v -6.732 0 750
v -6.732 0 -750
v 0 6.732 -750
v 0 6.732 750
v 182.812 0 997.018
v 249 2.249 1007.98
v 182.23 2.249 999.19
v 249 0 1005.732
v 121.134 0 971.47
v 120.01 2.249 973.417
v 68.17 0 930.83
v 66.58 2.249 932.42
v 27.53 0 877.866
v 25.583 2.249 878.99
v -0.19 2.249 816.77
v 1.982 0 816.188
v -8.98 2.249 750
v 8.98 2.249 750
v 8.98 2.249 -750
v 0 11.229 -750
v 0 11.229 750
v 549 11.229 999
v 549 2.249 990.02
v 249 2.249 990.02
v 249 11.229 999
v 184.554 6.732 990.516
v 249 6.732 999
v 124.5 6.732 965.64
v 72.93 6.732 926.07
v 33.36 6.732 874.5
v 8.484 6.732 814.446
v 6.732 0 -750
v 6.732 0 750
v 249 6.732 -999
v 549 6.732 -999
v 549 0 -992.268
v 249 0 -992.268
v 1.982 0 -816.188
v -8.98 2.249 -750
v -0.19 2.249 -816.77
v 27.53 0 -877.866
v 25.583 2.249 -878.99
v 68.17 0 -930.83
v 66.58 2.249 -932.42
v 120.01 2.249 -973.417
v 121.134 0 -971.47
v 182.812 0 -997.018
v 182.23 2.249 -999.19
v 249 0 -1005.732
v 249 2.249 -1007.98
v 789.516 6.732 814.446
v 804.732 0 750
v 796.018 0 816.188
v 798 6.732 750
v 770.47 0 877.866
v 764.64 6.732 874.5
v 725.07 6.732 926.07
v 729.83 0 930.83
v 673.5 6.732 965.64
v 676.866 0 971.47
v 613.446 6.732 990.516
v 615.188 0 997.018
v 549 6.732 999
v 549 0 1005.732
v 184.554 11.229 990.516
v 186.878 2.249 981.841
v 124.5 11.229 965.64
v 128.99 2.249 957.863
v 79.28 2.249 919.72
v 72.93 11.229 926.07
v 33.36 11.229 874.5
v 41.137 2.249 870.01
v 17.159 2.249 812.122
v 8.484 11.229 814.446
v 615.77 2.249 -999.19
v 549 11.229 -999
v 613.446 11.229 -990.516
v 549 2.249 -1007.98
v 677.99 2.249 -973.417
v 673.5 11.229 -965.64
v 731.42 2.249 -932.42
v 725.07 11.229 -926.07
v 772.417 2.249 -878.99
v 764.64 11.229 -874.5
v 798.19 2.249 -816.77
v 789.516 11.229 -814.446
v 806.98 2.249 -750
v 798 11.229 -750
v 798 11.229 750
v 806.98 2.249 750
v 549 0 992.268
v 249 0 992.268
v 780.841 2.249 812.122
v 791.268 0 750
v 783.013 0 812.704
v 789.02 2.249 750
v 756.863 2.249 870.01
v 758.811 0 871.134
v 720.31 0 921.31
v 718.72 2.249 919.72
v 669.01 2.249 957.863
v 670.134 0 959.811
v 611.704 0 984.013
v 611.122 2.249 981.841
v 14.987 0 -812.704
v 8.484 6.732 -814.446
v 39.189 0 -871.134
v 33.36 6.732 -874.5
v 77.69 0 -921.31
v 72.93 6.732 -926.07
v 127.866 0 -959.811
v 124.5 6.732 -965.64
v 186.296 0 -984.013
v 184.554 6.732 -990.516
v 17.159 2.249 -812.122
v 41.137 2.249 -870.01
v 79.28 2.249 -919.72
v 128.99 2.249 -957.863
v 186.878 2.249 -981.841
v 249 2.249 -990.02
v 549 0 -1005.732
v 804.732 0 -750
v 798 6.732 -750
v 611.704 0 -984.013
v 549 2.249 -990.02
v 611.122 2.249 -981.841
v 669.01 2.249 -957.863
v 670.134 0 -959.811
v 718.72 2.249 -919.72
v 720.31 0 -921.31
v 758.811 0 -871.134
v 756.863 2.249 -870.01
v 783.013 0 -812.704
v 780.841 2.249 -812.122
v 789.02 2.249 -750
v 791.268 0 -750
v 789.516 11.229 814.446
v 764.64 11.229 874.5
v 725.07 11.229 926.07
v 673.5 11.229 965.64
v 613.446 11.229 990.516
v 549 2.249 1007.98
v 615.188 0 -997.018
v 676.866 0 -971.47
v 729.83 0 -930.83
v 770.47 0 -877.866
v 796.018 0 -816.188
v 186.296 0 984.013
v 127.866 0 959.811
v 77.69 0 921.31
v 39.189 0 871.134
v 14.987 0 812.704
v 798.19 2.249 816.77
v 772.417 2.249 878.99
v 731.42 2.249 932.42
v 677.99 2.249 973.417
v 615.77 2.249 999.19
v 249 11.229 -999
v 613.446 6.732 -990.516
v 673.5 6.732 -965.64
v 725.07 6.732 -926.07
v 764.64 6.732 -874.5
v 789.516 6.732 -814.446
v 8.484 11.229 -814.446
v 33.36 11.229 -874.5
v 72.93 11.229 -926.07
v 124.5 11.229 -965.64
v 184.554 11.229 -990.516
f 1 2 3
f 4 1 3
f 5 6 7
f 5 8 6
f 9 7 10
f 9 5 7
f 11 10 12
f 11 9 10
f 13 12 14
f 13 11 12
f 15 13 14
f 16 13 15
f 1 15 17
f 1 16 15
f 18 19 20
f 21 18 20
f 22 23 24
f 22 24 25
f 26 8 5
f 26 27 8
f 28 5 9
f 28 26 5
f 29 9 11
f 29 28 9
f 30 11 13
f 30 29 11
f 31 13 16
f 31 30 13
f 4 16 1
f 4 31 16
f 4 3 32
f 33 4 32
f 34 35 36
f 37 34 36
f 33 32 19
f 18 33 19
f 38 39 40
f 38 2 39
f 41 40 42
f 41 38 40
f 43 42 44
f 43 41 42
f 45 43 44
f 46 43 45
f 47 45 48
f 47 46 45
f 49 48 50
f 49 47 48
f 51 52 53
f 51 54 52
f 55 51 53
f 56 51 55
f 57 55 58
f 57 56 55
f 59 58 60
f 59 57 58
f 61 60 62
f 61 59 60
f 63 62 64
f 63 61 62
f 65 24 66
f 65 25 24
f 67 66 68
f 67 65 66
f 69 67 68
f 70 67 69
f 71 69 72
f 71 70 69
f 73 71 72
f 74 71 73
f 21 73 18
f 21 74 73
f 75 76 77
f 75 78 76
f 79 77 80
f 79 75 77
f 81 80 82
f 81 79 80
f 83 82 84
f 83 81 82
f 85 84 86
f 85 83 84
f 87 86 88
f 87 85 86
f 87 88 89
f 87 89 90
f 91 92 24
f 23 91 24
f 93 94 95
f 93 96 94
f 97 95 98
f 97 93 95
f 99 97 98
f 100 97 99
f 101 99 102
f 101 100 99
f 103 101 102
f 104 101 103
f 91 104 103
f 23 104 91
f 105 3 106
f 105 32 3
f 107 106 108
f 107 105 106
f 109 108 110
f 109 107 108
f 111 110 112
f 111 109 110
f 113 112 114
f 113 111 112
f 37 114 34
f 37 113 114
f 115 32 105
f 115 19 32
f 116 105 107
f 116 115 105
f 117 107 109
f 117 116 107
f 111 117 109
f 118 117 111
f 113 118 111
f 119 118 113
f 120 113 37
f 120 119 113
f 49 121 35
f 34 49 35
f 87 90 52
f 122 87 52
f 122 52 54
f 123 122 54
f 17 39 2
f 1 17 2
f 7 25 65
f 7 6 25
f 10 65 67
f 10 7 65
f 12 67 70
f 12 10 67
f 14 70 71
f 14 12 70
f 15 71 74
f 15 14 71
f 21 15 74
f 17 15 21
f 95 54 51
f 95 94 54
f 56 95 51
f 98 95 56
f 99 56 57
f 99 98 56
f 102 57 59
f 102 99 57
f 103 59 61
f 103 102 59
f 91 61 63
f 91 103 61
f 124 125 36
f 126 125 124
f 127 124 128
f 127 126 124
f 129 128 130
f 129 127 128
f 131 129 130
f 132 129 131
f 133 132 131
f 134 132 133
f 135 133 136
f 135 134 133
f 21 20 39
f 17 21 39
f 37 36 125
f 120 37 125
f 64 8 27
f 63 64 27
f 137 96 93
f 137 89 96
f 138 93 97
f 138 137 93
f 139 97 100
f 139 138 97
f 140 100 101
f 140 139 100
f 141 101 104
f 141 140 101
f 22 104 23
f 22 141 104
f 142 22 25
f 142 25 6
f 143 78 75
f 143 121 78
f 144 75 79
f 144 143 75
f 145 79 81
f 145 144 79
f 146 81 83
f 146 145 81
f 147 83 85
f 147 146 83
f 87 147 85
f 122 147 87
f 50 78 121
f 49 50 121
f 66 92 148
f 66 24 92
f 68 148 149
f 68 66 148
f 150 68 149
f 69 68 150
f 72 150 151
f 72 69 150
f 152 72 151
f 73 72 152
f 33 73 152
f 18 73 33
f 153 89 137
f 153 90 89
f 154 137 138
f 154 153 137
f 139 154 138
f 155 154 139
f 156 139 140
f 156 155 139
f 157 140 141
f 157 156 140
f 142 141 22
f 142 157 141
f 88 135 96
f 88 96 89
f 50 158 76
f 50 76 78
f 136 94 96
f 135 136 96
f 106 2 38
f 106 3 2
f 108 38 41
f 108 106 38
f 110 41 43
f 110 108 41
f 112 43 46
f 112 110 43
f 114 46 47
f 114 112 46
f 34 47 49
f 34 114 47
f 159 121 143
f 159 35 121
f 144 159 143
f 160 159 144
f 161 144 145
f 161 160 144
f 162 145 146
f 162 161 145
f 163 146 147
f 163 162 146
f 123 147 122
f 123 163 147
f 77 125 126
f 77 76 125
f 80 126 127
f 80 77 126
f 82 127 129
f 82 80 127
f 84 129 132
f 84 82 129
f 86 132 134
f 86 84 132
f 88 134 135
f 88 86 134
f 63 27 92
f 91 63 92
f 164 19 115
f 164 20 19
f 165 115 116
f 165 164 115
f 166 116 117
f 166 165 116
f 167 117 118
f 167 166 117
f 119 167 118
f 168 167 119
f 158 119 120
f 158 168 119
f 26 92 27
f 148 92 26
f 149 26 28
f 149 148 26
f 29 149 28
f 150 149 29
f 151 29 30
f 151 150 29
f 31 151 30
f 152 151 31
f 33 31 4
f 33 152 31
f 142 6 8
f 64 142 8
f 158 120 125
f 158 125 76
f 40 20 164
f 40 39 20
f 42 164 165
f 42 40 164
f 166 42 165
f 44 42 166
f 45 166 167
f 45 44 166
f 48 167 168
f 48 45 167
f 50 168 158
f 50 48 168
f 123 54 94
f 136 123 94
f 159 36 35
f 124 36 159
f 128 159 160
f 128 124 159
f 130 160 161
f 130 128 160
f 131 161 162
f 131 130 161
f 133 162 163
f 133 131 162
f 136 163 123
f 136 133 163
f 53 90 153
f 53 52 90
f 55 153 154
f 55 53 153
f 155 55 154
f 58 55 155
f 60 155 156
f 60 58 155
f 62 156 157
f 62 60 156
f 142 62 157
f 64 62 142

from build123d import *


with BuildPart() as part:
    # Varredura1: sweep along a path in Esboço2
    with BuildLine(Plane(origin=(0, 0, 0), x_dir=(1, 0, 0), z_dir=(0, 1, 0))) as varredura1_path:
        Line((0, -750), (0, 750))
        ThreePointArc((0, 750), (72.930411485, 926.069588515), (249, 999))
        Line((249, 999), (549, 999))
        ThreePointArc((549, 999), (725.069588515, 926.069588515), (798, 750))
        Line((798, 750), (798, -750))
        ThreePointArc((798, -750), (725.069588515, -926.069588515), (549, -999))
        Line((549, -999), (249, -999))
        ThreePointArc((249, -999), (72.930411485, -926.069588515), (0, -750))
    # Esboço1 → Varredura1 (sweep)
    with BuildSketch(Plane.XY):
        Polygon((0, 11.228855685), (8.980256121, 2.248599564), (6.731656557, 0), (0, 6.731656557), (-6.731656557, 0), (-8.980256121, 2.248599564), align=None)
    sweep(path=varredura1_path.line)


solid = part.part
